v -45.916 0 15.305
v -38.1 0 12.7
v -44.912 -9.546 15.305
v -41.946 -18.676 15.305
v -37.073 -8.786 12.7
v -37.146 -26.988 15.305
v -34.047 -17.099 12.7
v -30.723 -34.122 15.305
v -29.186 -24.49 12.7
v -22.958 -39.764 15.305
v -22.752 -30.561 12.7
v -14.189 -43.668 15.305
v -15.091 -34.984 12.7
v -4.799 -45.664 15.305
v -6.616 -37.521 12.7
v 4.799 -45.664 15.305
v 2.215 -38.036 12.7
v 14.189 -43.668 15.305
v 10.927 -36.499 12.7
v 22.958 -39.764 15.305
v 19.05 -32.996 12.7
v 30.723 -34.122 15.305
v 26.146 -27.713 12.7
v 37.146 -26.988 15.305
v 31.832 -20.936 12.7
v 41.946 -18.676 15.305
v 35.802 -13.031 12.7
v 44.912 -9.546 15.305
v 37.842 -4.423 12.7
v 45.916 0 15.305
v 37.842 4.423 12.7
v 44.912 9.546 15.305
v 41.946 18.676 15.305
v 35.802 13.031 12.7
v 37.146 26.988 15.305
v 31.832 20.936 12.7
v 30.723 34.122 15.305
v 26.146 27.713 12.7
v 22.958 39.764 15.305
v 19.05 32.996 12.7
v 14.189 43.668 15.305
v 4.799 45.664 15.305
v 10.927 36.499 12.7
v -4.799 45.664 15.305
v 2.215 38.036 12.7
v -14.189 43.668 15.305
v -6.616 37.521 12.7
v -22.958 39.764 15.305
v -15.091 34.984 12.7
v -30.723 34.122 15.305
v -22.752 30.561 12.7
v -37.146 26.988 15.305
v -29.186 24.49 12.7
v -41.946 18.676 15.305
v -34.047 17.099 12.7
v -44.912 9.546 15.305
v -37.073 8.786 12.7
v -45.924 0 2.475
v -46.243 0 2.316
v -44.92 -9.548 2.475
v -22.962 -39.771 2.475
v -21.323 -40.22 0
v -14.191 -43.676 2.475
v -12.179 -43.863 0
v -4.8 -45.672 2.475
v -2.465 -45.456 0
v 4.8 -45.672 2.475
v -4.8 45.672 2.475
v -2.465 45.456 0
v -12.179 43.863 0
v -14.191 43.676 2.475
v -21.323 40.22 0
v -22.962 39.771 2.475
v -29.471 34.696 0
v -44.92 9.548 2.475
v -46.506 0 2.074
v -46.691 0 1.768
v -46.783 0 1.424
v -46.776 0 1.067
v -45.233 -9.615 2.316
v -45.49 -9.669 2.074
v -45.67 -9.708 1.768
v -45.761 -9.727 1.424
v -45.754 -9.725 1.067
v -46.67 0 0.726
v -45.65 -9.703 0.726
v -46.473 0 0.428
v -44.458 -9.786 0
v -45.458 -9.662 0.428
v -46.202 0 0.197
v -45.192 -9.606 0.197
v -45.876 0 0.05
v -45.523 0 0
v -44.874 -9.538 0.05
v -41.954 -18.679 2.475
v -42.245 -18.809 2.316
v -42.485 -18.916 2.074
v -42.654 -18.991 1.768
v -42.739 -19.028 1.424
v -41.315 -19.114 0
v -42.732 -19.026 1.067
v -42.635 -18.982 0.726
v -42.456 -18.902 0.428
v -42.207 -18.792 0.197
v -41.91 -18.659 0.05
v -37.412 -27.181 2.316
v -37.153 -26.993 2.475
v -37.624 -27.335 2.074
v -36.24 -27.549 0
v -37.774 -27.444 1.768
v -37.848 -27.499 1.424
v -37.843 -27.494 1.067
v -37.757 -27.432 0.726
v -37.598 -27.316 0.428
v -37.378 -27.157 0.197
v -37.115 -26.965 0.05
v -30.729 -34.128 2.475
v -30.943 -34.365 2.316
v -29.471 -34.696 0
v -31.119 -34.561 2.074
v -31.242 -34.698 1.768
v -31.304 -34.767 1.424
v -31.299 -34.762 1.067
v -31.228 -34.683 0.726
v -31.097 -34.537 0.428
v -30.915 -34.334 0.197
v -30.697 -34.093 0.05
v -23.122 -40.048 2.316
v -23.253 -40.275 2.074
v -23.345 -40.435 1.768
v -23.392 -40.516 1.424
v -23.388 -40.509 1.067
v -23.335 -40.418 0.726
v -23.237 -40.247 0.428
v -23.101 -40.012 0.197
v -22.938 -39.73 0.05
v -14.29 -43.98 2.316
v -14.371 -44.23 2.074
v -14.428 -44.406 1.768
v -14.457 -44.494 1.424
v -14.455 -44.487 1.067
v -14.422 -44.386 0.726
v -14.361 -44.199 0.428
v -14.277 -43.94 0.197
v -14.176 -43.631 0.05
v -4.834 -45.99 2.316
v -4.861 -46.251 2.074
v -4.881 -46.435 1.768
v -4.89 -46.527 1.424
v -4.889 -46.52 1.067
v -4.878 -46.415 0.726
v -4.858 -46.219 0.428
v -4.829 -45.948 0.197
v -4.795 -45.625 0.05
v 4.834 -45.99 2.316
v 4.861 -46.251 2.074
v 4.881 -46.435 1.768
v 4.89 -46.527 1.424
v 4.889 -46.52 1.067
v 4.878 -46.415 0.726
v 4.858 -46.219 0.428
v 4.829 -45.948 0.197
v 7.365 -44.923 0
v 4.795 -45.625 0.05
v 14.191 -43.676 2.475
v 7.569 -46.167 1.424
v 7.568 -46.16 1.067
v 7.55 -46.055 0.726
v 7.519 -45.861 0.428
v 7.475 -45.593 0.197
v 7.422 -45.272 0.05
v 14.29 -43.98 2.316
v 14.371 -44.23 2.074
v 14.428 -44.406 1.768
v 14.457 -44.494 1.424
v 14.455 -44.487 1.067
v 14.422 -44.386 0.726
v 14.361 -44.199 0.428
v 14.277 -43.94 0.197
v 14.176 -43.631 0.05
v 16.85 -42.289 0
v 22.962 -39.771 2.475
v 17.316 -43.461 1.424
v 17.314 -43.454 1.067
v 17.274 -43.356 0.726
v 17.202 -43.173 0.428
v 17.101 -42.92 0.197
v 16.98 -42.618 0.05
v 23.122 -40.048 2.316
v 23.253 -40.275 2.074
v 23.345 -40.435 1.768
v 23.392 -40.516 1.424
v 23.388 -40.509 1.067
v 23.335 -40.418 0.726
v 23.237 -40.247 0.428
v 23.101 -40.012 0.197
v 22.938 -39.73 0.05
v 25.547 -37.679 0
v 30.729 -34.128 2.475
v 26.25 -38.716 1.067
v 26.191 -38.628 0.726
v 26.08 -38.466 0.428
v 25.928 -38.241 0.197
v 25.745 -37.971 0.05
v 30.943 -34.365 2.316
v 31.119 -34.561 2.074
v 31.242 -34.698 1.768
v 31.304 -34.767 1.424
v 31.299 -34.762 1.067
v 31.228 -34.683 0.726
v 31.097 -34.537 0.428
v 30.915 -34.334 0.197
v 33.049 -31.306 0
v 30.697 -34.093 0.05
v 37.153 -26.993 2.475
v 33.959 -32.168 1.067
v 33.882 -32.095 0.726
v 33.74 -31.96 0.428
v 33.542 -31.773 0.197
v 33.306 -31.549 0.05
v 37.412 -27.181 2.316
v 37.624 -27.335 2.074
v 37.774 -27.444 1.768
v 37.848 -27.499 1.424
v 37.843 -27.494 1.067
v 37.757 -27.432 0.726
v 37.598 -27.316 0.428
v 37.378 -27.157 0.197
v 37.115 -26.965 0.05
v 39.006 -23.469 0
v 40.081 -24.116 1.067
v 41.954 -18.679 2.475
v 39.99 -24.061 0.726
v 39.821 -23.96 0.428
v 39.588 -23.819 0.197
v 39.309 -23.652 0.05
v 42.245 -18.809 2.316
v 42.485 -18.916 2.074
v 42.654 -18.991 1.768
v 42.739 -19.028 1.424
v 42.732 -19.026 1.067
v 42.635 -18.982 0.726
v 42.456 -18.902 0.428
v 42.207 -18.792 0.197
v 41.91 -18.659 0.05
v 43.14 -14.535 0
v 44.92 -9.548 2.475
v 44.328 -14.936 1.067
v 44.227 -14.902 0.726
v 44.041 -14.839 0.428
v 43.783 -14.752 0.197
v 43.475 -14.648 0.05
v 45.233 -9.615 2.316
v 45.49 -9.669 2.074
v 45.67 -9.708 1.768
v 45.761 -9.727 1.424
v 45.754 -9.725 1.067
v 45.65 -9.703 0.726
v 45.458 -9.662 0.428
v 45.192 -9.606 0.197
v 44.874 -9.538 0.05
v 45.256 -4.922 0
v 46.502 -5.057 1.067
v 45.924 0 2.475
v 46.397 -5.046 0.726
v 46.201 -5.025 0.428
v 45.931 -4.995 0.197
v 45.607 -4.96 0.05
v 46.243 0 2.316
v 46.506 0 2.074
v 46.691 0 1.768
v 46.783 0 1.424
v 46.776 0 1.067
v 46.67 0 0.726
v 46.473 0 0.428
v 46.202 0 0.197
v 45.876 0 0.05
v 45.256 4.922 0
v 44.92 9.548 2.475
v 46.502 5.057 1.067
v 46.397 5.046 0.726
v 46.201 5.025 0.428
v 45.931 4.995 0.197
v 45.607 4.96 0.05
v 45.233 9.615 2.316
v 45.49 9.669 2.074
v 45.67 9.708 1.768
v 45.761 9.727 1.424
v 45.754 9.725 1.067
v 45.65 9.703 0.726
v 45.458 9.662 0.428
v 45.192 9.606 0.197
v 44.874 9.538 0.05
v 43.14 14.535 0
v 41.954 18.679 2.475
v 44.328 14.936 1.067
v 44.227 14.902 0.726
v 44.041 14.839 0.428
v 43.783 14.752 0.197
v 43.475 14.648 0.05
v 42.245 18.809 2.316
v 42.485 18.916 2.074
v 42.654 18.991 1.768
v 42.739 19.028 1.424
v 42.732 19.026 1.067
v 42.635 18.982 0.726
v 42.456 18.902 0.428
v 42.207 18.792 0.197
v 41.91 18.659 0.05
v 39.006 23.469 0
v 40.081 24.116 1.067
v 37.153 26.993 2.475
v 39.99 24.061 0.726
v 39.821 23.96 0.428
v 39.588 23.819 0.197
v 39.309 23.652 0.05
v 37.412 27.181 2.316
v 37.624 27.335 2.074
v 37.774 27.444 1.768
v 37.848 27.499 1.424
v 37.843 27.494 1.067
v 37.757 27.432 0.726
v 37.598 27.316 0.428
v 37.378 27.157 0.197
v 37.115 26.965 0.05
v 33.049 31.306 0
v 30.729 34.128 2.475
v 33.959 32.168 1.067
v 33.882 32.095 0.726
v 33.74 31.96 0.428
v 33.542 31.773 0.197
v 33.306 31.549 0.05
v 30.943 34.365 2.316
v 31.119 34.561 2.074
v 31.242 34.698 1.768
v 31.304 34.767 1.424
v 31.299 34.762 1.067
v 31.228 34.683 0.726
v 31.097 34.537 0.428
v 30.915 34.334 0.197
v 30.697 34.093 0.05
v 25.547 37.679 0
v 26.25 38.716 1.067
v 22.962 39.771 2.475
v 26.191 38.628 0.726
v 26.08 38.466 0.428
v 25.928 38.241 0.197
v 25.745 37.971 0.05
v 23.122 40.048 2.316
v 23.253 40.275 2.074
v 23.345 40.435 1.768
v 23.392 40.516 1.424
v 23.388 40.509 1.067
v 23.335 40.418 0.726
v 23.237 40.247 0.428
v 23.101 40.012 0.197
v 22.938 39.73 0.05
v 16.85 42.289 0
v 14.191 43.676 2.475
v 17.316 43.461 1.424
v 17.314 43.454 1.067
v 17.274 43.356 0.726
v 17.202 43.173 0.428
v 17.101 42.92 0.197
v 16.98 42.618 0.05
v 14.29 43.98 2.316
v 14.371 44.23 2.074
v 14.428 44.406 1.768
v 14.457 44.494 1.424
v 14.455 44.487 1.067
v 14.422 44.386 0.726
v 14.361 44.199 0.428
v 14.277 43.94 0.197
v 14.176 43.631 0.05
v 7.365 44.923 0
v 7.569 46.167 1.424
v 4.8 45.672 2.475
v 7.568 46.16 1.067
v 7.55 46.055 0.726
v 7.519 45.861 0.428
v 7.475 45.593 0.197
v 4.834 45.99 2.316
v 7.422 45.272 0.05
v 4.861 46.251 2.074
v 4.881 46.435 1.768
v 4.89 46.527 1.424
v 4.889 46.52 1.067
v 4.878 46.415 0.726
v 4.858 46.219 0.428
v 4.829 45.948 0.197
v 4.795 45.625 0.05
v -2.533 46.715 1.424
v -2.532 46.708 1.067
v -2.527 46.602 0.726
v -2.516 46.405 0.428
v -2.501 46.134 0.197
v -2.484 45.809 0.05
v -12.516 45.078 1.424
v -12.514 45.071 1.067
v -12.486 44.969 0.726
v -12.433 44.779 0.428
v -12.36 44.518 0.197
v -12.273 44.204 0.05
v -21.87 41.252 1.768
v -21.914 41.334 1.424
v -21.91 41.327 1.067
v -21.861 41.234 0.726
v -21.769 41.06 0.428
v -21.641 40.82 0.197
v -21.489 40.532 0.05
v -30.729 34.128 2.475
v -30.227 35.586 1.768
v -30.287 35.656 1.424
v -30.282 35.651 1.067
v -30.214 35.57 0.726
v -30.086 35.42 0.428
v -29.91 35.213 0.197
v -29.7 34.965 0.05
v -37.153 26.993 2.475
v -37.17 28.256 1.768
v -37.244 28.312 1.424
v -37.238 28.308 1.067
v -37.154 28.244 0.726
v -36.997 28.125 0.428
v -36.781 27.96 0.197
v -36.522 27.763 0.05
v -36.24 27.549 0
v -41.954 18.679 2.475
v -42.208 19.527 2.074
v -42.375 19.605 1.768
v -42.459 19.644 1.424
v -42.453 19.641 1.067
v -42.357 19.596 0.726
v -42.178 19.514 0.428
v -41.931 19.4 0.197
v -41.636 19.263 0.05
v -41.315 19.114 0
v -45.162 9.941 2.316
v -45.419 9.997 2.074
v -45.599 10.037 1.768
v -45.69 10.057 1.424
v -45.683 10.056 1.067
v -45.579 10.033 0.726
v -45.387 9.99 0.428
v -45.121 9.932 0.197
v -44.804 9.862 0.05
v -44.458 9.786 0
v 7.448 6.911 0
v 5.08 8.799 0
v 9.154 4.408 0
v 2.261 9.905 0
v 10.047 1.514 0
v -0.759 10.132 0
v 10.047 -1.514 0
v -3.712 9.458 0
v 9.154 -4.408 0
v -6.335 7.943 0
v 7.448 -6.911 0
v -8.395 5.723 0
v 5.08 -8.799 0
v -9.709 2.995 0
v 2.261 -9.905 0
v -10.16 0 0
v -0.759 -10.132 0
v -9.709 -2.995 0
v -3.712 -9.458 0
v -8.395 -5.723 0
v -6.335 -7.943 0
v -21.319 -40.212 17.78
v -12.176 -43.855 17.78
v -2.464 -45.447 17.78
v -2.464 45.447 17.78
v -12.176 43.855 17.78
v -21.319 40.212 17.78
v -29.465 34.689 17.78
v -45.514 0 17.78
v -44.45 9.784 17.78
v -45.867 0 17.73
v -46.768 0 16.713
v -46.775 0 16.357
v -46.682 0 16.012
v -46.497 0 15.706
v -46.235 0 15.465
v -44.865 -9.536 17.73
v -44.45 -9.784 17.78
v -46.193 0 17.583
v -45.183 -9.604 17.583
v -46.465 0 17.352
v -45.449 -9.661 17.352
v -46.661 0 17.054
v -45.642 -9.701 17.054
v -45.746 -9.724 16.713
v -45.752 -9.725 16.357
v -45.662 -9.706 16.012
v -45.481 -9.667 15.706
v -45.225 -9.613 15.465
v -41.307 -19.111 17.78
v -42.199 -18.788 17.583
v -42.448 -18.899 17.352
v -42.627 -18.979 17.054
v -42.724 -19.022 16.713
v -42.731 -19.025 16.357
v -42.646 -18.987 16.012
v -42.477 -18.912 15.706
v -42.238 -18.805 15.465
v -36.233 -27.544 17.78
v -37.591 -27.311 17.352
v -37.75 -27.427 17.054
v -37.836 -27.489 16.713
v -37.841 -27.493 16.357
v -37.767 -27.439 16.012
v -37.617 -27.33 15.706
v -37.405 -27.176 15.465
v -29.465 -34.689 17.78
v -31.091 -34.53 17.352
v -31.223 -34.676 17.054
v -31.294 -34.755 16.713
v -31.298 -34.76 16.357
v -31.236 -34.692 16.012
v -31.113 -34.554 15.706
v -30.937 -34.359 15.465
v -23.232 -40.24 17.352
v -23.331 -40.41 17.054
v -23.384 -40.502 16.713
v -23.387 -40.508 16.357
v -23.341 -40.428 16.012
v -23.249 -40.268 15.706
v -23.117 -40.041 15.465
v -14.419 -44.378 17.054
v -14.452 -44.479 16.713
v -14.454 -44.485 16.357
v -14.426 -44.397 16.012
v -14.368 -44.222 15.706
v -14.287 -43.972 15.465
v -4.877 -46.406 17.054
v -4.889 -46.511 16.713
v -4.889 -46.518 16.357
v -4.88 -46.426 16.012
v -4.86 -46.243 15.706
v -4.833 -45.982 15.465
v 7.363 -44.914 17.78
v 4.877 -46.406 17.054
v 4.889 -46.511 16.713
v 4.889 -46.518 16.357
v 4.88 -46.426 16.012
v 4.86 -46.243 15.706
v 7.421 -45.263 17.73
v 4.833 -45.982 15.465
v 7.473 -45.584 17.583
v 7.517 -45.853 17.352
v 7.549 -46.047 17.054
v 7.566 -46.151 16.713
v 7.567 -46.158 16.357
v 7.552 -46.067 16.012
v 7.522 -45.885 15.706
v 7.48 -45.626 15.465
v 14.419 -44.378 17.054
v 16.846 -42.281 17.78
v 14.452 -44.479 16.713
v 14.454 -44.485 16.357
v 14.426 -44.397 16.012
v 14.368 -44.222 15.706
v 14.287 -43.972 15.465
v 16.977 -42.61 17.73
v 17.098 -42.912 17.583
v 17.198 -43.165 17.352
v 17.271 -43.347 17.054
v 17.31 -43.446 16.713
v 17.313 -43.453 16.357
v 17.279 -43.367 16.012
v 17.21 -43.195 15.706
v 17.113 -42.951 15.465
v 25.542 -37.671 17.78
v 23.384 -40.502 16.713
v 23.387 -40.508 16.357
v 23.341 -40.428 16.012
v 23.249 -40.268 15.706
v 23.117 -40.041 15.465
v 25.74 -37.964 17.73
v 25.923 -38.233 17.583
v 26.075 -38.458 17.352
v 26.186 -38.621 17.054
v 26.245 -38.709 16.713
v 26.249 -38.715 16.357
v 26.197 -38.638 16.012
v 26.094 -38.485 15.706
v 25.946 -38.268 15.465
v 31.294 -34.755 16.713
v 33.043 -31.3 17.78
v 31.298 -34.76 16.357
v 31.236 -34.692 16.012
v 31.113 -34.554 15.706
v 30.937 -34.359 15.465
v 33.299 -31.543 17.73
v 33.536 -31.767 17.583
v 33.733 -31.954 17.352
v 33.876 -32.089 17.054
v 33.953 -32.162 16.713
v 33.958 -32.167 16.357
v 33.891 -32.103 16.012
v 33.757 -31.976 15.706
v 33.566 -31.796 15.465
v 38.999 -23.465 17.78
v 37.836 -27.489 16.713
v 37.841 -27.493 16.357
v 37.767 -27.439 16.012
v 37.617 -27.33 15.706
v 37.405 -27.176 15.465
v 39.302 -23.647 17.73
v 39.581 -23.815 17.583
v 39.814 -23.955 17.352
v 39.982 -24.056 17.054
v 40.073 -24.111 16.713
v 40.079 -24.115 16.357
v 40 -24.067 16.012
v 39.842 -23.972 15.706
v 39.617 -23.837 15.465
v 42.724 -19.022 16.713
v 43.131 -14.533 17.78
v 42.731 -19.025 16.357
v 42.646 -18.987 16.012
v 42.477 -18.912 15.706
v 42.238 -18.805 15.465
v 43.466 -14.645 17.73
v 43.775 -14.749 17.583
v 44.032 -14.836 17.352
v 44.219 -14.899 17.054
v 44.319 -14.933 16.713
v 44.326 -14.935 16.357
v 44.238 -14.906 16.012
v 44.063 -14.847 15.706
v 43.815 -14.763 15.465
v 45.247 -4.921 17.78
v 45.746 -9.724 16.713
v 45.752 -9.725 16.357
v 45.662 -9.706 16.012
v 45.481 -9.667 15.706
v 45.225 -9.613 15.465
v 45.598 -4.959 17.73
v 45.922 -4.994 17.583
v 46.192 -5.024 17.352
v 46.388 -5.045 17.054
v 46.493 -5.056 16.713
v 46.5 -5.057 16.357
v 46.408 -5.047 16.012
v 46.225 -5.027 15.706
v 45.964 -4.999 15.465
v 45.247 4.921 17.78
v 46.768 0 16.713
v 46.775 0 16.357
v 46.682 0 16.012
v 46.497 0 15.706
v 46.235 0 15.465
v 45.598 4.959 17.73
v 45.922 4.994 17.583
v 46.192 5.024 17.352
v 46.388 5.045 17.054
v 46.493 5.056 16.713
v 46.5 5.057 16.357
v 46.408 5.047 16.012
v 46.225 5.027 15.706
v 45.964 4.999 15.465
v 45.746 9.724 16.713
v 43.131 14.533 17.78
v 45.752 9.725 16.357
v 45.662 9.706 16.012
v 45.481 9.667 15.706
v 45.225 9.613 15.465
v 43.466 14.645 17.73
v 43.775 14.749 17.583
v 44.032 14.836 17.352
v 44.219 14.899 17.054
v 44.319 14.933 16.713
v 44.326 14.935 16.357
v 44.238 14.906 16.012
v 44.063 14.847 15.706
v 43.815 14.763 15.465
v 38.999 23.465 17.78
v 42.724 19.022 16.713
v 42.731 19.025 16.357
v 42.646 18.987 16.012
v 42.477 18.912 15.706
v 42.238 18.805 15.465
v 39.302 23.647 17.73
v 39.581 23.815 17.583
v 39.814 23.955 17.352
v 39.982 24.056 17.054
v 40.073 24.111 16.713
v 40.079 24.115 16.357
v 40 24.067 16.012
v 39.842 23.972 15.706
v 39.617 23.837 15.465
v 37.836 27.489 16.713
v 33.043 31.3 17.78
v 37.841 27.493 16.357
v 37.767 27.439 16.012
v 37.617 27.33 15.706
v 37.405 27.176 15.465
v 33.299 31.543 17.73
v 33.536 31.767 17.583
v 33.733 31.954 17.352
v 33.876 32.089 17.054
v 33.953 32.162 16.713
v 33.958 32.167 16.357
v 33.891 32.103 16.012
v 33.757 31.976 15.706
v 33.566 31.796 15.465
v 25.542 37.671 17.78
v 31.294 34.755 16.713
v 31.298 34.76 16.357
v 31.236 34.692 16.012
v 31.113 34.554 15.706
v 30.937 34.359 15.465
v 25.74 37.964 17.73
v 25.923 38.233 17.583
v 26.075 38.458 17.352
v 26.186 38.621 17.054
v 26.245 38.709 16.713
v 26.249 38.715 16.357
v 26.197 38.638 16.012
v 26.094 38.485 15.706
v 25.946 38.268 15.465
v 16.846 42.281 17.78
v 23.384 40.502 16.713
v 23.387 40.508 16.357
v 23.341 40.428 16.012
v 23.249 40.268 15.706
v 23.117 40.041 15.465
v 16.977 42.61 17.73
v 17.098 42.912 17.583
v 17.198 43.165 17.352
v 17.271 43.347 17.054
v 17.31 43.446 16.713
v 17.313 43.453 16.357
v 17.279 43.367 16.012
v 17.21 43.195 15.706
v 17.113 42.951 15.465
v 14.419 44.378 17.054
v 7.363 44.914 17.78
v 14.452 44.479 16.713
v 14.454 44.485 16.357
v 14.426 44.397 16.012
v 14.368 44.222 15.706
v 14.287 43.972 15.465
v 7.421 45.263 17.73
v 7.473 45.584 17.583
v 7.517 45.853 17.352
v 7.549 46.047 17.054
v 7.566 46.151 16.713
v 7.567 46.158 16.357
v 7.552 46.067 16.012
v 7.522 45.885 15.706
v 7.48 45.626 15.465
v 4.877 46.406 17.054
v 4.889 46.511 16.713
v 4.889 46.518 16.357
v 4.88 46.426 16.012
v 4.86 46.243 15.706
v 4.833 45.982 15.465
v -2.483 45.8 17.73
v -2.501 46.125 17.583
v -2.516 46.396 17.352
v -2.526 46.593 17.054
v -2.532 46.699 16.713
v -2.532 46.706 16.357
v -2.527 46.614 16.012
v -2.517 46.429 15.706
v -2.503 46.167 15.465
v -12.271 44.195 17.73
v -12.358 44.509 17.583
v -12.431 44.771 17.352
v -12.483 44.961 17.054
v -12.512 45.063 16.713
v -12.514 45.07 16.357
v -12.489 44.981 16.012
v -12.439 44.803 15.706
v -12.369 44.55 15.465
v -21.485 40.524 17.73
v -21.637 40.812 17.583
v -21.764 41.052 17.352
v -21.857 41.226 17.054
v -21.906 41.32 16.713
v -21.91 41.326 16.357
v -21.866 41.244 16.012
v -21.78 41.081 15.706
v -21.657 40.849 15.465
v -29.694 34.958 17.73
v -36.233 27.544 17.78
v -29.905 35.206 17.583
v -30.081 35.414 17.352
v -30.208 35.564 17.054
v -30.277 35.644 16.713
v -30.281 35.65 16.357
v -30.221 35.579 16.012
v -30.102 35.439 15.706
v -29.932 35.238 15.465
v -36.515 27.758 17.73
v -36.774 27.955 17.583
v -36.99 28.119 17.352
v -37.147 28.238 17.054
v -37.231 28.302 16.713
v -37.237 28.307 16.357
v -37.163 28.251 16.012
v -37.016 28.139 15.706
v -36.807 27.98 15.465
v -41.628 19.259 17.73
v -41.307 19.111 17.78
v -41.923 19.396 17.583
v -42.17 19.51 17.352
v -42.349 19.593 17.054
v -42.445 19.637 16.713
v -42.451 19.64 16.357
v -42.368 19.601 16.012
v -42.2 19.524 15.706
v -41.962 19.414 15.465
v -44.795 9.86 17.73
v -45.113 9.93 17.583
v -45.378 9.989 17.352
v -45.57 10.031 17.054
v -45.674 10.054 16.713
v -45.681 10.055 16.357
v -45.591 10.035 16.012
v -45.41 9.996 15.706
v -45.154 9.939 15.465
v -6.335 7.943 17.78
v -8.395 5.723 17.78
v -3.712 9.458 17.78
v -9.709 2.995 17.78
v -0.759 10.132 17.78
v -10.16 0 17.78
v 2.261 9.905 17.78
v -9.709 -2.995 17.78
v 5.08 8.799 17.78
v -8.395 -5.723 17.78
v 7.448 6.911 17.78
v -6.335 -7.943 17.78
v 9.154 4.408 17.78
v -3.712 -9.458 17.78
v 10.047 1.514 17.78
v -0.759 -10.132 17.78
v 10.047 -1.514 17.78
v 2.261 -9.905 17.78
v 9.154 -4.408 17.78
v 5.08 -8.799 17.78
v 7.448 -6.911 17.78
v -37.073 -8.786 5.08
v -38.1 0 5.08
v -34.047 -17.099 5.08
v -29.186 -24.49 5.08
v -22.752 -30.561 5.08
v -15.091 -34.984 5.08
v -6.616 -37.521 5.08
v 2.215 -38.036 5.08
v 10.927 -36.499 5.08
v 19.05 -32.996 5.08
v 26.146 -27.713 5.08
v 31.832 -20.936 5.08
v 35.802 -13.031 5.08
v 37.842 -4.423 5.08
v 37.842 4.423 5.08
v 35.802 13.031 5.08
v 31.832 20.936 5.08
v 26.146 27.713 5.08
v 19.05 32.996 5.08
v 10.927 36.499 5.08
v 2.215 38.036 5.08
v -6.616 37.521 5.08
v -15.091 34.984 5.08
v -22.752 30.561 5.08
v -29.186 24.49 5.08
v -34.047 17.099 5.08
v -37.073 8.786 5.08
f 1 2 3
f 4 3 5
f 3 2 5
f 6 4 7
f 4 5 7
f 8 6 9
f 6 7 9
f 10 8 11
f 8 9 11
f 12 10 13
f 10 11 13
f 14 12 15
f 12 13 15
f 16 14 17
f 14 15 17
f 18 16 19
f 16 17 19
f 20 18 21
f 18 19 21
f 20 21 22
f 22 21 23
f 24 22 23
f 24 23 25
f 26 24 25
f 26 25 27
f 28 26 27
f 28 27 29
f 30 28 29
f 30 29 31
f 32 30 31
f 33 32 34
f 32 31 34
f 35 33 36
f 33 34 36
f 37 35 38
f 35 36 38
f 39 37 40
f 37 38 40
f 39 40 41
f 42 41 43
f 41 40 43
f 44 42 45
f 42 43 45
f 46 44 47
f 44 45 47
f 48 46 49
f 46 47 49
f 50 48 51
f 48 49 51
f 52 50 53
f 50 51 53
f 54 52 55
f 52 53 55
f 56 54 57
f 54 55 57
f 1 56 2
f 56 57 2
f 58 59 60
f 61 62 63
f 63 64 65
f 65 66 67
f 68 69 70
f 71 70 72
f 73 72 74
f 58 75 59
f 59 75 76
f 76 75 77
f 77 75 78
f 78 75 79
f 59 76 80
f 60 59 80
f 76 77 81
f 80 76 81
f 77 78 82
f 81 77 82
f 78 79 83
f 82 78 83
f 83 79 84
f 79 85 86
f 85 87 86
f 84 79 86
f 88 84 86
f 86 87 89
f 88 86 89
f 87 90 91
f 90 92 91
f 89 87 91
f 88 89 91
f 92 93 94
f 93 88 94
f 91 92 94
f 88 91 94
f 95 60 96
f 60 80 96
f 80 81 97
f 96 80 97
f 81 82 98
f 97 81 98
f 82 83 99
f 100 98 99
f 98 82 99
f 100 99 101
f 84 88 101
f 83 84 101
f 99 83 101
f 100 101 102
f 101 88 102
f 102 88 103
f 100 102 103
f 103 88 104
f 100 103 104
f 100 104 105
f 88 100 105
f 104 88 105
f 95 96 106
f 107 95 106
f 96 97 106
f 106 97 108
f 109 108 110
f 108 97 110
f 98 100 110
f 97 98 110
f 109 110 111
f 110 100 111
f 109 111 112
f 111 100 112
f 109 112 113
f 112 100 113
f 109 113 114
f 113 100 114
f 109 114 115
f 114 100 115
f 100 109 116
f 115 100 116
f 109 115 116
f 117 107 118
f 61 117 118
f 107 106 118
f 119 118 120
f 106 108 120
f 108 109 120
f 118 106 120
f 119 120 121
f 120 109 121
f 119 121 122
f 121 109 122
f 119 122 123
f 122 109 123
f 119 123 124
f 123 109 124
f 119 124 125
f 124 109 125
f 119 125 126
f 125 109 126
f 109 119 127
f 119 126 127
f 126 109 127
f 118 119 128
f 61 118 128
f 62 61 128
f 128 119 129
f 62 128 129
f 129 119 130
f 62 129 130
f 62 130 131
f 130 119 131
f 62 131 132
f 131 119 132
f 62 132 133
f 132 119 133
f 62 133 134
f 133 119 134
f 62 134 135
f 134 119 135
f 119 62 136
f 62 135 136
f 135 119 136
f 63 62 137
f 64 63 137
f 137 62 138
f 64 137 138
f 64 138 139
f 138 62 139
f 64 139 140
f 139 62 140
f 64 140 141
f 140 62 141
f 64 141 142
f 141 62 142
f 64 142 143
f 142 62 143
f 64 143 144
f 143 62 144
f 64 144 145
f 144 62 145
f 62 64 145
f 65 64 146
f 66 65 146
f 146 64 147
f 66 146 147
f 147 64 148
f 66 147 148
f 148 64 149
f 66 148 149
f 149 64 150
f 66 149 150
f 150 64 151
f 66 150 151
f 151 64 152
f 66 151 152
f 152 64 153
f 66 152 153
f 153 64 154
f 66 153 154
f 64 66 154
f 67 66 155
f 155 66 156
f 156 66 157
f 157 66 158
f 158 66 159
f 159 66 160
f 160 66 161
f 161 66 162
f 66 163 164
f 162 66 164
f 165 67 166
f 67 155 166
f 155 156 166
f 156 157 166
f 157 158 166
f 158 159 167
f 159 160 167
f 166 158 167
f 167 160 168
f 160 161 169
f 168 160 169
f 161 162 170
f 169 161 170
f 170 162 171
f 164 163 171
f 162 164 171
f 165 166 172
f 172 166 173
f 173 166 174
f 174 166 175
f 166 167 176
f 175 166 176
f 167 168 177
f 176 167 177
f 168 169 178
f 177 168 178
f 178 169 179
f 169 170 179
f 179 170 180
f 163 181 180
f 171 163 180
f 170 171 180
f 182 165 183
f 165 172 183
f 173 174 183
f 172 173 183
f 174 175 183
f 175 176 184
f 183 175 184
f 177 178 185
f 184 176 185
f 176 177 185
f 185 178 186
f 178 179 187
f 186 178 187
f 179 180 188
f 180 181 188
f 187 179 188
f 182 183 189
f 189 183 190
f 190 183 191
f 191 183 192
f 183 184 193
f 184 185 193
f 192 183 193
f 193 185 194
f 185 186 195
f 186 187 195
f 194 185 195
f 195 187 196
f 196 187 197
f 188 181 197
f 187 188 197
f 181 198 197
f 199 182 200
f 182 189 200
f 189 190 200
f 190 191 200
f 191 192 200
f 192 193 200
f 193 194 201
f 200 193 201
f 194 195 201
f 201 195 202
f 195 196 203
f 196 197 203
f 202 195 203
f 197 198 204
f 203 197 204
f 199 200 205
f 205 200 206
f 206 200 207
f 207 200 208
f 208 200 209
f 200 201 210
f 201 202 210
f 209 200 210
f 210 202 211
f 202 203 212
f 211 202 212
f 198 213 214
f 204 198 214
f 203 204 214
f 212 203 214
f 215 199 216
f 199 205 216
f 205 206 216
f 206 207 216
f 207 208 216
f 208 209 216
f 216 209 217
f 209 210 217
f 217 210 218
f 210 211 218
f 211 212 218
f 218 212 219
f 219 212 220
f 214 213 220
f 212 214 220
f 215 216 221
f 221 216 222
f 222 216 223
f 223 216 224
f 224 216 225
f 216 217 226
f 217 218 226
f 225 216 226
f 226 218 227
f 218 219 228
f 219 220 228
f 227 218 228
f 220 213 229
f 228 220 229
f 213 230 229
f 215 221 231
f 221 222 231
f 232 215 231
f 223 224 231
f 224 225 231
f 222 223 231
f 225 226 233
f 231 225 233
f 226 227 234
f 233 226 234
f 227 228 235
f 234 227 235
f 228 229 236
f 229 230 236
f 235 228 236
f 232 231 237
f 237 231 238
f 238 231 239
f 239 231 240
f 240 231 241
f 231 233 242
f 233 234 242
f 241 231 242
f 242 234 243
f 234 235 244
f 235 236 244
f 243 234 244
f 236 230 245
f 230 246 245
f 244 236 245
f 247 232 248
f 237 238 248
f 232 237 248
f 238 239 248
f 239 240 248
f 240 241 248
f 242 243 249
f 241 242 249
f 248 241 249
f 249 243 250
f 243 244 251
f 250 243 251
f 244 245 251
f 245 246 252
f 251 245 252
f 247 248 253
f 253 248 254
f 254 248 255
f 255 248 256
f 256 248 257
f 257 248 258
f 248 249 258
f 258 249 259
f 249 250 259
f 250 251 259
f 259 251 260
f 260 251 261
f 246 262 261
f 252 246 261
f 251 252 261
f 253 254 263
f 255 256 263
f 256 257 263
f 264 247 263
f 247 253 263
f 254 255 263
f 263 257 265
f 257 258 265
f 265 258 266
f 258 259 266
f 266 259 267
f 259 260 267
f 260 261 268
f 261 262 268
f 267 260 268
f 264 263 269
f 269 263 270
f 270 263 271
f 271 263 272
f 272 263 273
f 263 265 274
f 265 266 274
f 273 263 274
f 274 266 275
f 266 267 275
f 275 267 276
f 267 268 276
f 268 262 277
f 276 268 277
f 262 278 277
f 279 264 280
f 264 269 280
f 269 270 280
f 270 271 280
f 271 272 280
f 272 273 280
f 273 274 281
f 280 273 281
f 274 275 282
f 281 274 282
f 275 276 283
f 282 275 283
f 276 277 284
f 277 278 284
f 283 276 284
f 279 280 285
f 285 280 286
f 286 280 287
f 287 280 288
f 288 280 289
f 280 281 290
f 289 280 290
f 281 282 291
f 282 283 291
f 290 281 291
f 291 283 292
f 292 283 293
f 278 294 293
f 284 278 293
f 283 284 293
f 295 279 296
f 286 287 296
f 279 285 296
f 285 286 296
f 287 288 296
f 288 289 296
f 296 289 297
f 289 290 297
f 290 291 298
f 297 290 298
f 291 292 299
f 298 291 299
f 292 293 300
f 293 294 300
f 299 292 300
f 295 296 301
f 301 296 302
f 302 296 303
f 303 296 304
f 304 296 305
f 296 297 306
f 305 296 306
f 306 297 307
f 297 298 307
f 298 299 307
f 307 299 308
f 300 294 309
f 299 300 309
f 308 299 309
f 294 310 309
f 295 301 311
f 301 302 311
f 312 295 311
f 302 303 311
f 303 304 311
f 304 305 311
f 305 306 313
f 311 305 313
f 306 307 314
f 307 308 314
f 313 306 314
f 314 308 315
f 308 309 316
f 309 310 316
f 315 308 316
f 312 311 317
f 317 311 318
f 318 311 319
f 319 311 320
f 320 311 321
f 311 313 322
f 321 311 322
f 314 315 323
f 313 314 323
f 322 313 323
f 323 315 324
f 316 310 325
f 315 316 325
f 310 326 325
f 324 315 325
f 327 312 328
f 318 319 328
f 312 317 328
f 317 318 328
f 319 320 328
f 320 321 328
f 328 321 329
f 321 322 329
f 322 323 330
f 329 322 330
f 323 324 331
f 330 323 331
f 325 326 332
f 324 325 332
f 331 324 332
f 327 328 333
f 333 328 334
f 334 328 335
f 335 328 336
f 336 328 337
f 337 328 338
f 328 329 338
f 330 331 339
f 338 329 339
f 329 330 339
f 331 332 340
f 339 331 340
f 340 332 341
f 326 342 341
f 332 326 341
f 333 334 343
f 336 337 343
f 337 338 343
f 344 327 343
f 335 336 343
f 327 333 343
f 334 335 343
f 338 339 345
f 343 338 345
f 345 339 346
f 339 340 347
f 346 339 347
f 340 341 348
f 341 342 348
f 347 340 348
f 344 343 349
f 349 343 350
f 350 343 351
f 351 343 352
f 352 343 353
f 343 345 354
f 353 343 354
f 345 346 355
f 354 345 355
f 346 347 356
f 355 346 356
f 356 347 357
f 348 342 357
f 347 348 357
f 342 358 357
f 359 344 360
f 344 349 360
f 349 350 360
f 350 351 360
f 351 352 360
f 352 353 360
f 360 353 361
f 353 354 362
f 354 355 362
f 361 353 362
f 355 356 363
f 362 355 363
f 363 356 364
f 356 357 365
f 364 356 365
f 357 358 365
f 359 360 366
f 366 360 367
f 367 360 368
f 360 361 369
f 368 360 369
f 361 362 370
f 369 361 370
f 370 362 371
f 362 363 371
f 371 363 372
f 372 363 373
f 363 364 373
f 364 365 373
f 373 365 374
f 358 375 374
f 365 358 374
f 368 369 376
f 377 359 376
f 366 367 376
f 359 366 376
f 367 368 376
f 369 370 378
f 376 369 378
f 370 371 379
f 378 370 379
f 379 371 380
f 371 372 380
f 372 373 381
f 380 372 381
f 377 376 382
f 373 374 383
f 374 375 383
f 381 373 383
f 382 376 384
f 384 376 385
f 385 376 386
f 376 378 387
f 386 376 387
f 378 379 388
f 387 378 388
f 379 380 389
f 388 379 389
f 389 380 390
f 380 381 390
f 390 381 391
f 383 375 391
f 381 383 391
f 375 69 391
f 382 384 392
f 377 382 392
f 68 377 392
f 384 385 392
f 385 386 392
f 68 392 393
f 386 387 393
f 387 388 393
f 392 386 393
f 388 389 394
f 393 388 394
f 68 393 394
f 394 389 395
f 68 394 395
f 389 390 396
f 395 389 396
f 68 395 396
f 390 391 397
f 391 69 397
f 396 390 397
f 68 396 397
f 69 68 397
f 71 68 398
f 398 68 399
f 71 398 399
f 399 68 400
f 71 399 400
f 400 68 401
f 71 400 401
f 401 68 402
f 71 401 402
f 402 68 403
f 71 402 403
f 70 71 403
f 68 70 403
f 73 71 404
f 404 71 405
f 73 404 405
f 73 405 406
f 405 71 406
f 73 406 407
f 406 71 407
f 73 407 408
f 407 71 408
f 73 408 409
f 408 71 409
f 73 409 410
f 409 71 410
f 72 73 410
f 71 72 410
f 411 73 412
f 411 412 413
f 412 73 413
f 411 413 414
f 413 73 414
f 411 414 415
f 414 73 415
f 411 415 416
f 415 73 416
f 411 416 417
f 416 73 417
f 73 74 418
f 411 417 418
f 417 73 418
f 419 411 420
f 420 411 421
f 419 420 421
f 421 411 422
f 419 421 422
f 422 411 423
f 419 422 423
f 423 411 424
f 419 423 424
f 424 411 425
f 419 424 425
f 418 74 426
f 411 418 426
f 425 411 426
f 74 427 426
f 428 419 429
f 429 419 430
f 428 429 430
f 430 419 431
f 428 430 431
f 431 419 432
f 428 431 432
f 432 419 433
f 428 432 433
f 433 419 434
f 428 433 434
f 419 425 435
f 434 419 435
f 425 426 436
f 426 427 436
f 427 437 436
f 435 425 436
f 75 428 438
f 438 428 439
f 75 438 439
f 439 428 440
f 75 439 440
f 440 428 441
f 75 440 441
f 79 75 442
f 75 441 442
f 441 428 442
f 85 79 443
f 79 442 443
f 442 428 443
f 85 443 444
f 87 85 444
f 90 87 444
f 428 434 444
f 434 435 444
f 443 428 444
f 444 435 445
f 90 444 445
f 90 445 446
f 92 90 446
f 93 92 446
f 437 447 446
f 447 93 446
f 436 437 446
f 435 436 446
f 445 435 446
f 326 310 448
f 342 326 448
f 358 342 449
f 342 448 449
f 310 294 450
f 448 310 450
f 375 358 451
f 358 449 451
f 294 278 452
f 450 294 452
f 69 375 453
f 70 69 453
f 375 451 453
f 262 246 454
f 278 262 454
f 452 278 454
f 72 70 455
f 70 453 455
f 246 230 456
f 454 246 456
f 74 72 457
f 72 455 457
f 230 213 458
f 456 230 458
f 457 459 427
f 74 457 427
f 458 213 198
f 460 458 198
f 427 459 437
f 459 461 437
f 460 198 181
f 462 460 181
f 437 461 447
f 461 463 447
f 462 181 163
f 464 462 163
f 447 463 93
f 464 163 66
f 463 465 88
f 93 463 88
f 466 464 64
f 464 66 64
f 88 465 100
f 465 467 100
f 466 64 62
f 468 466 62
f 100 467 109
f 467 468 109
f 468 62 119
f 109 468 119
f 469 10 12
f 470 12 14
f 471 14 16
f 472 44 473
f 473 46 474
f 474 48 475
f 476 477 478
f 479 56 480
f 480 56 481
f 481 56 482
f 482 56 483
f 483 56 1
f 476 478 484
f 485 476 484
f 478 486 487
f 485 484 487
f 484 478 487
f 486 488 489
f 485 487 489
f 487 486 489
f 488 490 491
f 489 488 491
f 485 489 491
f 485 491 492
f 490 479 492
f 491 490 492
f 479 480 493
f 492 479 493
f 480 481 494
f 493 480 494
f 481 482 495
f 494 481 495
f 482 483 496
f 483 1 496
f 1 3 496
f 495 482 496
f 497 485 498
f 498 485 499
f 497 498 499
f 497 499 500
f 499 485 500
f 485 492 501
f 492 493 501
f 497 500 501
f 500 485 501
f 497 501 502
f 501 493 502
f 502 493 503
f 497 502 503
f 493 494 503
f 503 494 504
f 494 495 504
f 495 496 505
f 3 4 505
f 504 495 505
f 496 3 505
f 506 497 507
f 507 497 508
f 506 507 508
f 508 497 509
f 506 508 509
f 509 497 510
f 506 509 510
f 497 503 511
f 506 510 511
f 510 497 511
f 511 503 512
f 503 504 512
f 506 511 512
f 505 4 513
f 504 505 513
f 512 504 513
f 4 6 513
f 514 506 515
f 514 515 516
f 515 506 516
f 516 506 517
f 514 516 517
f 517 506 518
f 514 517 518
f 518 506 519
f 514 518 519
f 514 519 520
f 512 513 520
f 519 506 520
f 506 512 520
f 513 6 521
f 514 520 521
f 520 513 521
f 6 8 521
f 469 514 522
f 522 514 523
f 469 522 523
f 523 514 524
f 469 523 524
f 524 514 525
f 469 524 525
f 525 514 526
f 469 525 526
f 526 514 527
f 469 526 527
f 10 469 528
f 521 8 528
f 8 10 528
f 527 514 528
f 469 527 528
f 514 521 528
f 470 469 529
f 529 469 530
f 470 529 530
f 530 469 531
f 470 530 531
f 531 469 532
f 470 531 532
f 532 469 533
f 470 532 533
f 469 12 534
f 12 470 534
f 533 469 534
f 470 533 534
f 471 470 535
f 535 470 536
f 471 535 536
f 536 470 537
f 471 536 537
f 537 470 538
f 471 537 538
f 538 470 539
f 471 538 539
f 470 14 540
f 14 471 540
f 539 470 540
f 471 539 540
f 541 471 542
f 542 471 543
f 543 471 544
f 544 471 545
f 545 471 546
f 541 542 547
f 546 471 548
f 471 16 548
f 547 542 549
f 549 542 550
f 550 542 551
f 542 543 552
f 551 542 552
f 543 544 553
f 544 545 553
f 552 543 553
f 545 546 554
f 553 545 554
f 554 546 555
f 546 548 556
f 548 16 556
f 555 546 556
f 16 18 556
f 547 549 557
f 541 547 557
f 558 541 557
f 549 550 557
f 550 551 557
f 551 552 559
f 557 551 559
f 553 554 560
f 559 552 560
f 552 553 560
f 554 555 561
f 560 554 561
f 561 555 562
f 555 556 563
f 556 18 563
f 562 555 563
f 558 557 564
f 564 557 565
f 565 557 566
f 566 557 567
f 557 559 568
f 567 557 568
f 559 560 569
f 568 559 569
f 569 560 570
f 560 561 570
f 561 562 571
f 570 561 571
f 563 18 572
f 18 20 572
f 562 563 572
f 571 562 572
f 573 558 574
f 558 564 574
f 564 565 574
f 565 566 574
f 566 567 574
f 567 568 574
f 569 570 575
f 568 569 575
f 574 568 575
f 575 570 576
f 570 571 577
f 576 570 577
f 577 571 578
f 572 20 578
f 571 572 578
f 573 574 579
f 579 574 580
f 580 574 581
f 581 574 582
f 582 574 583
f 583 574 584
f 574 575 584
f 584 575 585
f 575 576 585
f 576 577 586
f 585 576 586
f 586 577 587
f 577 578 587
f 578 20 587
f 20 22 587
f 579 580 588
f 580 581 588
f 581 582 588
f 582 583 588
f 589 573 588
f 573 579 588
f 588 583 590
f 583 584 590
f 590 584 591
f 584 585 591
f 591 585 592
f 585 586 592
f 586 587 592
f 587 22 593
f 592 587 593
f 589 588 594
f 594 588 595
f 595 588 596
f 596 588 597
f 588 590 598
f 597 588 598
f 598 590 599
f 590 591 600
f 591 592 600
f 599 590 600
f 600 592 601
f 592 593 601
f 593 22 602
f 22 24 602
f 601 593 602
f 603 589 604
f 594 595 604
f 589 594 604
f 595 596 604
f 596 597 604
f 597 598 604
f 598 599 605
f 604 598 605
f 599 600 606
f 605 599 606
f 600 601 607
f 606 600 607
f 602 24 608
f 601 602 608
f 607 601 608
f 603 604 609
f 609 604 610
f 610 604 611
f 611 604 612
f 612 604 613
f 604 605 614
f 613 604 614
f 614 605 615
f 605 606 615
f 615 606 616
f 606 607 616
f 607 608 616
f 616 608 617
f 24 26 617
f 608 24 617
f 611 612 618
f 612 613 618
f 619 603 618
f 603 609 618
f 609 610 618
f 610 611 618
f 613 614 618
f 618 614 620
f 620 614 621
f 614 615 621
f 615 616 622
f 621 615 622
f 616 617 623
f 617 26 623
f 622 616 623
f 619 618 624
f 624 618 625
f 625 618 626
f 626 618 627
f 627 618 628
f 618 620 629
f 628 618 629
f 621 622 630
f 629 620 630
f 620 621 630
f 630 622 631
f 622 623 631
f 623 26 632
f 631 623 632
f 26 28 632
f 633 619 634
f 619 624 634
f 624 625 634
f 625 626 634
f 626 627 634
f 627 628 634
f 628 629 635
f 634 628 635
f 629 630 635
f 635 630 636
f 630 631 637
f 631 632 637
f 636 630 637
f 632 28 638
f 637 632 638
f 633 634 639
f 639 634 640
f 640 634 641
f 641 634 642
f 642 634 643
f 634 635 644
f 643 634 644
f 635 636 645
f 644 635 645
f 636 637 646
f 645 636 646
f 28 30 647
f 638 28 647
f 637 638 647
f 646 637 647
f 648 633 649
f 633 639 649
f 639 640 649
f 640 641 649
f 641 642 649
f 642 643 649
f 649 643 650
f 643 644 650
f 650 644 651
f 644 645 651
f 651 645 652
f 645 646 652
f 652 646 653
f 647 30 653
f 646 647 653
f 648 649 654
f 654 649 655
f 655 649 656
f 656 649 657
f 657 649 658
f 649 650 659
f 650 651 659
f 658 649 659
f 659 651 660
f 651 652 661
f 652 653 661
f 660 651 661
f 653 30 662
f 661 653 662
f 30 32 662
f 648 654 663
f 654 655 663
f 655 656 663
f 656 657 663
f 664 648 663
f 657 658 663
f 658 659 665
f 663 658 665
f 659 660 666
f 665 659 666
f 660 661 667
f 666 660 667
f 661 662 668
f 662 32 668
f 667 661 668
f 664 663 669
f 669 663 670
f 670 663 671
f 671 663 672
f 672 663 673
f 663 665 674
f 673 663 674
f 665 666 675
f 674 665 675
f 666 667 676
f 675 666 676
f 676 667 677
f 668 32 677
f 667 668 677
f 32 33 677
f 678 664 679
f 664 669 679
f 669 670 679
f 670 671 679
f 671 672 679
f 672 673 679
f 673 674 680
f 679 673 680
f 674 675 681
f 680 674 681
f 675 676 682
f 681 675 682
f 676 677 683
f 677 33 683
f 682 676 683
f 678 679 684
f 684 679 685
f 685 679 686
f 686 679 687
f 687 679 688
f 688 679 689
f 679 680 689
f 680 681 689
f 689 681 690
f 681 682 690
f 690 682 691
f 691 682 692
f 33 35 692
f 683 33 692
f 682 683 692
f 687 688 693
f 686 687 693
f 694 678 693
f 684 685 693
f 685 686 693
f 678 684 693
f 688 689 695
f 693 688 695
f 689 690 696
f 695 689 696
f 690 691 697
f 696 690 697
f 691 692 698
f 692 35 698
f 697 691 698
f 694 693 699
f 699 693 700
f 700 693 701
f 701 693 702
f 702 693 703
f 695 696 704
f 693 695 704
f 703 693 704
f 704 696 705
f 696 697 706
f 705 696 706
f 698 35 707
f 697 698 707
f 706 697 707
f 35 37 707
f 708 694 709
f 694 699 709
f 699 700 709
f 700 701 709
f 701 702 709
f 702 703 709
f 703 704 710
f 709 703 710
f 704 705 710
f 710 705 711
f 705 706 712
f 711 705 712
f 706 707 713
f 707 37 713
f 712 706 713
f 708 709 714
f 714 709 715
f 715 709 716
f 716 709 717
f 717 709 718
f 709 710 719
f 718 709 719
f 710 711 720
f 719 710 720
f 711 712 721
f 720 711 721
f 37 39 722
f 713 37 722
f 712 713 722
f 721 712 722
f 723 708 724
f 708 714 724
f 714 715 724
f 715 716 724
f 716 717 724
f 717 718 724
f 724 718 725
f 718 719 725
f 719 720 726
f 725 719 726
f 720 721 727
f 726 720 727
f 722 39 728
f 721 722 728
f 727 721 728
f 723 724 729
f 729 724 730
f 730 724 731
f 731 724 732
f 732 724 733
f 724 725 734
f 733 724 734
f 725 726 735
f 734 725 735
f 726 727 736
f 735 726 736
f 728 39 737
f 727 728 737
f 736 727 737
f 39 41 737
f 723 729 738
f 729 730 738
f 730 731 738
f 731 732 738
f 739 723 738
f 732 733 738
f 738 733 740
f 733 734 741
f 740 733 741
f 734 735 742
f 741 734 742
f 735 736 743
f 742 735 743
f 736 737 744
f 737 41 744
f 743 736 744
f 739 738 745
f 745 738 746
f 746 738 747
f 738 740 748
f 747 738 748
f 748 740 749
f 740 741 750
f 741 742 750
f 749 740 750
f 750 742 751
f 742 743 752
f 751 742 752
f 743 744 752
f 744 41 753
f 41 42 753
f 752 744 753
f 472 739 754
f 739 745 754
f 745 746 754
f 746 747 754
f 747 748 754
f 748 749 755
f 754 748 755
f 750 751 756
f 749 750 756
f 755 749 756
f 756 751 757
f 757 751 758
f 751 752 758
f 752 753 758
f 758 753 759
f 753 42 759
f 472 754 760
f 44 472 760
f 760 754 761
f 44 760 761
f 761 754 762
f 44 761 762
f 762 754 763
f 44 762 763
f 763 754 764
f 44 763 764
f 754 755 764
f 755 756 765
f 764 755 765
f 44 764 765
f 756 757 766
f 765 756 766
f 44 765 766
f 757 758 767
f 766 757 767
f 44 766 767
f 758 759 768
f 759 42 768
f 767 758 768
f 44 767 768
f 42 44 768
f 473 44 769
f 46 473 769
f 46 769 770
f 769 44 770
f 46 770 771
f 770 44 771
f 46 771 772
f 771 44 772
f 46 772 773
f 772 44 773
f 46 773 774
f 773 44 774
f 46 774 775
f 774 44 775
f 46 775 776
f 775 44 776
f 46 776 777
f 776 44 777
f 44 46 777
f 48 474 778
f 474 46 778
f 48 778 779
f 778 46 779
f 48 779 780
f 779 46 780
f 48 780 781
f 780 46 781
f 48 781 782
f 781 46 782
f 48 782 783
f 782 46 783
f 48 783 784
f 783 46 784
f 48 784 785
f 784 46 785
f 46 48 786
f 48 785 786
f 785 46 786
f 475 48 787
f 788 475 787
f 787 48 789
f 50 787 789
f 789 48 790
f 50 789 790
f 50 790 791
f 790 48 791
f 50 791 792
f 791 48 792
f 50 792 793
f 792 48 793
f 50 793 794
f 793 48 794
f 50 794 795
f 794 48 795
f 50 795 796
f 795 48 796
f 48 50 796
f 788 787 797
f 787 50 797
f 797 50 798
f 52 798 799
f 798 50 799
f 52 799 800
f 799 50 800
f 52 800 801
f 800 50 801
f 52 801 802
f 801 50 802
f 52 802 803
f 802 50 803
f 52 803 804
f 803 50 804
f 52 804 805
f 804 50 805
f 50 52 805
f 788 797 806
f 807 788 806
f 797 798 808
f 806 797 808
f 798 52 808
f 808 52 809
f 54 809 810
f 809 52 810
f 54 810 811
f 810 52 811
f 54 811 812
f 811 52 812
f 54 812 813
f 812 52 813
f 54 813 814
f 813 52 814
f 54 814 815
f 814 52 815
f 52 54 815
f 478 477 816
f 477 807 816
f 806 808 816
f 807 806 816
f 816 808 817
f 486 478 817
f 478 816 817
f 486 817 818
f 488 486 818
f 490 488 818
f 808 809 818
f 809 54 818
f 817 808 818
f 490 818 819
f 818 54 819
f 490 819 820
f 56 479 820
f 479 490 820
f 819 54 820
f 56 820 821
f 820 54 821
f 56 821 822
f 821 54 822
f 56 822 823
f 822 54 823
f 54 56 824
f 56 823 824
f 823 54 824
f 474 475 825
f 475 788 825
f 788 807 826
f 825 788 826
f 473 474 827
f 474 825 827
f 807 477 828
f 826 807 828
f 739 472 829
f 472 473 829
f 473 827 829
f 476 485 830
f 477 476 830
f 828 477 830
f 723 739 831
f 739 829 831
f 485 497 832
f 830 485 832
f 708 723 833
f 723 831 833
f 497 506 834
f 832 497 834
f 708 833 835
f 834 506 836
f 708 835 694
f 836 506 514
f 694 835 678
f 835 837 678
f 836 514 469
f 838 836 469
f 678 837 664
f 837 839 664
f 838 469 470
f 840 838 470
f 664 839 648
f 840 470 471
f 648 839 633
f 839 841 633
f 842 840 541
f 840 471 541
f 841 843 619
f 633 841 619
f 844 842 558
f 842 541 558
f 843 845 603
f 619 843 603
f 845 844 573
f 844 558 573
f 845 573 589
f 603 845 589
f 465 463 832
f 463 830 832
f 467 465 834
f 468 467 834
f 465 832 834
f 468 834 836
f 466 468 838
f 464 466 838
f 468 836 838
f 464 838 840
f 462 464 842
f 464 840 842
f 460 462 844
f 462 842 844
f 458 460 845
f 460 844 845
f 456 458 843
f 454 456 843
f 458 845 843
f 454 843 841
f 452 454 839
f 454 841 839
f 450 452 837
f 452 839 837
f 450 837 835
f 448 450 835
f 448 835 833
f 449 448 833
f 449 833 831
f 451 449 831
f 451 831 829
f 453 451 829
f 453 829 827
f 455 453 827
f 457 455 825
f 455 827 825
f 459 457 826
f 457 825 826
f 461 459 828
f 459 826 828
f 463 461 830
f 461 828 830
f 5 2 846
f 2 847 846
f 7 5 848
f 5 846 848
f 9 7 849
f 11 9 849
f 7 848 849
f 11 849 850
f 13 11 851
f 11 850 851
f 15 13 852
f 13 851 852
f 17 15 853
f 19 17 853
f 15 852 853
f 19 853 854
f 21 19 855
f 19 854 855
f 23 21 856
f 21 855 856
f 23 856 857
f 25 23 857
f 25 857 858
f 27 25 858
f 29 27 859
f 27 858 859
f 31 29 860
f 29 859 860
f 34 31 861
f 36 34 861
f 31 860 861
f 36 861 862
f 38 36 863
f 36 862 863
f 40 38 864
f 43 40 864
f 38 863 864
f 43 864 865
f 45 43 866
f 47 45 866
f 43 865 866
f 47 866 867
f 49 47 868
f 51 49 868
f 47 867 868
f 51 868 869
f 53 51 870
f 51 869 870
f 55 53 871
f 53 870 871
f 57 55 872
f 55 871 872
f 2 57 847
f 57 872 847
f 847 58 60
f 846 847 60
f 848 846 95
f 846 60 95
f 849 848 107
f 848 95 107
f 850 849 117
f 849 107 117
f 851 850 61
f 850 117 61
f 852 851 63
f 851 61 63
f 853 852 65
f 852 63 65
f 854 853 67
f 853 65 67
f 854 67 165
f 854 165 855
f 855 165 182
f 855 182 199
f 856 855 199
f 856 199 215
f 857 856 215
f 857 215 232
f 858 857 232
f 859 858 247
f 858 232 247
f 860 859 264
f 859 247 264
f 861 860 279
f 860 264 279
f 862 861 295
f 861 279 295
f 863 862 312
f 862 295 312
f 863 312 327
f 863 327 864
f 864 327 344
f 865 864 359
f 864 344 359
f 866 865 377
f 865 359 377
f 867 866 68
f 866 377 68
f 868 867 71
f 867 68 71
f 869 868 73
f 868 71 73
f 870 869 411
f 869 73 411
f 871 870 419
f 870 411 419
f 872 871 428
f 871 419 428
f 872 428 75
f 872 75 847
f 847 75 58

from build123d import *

# Parameters (mm, degrees)
FILLET2_R = 1.27


with BuildPart() as part:
    # Sketch1 → Revolve1 (revolve)
    with BuildSketch(Plane.YZ, mode=Mode.PRIVATE) as revolve1_sk:
        Polygon((10.16, 0), (10.16, 17.78), (53.34, 17.78), (38.1, 12.7), (38.1, 5.08), (53.357021735, 0), align=None)
    revolve(revolve1_sk.sketch.rotate(Axis((0, 0, 0), (0, 0, 1)), 90), axis=Axis((0, 0, 0), (0, 0, 1)))

    # Fillet2
    fillet2_edges = [part.edges().sort_by_distance(p)[0] for p in [
        (53.34, 0, 17.78),
        (53.357021735, 0, 0),
    ]]
    fillet(fillet2_edges, radius=FILLET2_R)


solid = part.part
